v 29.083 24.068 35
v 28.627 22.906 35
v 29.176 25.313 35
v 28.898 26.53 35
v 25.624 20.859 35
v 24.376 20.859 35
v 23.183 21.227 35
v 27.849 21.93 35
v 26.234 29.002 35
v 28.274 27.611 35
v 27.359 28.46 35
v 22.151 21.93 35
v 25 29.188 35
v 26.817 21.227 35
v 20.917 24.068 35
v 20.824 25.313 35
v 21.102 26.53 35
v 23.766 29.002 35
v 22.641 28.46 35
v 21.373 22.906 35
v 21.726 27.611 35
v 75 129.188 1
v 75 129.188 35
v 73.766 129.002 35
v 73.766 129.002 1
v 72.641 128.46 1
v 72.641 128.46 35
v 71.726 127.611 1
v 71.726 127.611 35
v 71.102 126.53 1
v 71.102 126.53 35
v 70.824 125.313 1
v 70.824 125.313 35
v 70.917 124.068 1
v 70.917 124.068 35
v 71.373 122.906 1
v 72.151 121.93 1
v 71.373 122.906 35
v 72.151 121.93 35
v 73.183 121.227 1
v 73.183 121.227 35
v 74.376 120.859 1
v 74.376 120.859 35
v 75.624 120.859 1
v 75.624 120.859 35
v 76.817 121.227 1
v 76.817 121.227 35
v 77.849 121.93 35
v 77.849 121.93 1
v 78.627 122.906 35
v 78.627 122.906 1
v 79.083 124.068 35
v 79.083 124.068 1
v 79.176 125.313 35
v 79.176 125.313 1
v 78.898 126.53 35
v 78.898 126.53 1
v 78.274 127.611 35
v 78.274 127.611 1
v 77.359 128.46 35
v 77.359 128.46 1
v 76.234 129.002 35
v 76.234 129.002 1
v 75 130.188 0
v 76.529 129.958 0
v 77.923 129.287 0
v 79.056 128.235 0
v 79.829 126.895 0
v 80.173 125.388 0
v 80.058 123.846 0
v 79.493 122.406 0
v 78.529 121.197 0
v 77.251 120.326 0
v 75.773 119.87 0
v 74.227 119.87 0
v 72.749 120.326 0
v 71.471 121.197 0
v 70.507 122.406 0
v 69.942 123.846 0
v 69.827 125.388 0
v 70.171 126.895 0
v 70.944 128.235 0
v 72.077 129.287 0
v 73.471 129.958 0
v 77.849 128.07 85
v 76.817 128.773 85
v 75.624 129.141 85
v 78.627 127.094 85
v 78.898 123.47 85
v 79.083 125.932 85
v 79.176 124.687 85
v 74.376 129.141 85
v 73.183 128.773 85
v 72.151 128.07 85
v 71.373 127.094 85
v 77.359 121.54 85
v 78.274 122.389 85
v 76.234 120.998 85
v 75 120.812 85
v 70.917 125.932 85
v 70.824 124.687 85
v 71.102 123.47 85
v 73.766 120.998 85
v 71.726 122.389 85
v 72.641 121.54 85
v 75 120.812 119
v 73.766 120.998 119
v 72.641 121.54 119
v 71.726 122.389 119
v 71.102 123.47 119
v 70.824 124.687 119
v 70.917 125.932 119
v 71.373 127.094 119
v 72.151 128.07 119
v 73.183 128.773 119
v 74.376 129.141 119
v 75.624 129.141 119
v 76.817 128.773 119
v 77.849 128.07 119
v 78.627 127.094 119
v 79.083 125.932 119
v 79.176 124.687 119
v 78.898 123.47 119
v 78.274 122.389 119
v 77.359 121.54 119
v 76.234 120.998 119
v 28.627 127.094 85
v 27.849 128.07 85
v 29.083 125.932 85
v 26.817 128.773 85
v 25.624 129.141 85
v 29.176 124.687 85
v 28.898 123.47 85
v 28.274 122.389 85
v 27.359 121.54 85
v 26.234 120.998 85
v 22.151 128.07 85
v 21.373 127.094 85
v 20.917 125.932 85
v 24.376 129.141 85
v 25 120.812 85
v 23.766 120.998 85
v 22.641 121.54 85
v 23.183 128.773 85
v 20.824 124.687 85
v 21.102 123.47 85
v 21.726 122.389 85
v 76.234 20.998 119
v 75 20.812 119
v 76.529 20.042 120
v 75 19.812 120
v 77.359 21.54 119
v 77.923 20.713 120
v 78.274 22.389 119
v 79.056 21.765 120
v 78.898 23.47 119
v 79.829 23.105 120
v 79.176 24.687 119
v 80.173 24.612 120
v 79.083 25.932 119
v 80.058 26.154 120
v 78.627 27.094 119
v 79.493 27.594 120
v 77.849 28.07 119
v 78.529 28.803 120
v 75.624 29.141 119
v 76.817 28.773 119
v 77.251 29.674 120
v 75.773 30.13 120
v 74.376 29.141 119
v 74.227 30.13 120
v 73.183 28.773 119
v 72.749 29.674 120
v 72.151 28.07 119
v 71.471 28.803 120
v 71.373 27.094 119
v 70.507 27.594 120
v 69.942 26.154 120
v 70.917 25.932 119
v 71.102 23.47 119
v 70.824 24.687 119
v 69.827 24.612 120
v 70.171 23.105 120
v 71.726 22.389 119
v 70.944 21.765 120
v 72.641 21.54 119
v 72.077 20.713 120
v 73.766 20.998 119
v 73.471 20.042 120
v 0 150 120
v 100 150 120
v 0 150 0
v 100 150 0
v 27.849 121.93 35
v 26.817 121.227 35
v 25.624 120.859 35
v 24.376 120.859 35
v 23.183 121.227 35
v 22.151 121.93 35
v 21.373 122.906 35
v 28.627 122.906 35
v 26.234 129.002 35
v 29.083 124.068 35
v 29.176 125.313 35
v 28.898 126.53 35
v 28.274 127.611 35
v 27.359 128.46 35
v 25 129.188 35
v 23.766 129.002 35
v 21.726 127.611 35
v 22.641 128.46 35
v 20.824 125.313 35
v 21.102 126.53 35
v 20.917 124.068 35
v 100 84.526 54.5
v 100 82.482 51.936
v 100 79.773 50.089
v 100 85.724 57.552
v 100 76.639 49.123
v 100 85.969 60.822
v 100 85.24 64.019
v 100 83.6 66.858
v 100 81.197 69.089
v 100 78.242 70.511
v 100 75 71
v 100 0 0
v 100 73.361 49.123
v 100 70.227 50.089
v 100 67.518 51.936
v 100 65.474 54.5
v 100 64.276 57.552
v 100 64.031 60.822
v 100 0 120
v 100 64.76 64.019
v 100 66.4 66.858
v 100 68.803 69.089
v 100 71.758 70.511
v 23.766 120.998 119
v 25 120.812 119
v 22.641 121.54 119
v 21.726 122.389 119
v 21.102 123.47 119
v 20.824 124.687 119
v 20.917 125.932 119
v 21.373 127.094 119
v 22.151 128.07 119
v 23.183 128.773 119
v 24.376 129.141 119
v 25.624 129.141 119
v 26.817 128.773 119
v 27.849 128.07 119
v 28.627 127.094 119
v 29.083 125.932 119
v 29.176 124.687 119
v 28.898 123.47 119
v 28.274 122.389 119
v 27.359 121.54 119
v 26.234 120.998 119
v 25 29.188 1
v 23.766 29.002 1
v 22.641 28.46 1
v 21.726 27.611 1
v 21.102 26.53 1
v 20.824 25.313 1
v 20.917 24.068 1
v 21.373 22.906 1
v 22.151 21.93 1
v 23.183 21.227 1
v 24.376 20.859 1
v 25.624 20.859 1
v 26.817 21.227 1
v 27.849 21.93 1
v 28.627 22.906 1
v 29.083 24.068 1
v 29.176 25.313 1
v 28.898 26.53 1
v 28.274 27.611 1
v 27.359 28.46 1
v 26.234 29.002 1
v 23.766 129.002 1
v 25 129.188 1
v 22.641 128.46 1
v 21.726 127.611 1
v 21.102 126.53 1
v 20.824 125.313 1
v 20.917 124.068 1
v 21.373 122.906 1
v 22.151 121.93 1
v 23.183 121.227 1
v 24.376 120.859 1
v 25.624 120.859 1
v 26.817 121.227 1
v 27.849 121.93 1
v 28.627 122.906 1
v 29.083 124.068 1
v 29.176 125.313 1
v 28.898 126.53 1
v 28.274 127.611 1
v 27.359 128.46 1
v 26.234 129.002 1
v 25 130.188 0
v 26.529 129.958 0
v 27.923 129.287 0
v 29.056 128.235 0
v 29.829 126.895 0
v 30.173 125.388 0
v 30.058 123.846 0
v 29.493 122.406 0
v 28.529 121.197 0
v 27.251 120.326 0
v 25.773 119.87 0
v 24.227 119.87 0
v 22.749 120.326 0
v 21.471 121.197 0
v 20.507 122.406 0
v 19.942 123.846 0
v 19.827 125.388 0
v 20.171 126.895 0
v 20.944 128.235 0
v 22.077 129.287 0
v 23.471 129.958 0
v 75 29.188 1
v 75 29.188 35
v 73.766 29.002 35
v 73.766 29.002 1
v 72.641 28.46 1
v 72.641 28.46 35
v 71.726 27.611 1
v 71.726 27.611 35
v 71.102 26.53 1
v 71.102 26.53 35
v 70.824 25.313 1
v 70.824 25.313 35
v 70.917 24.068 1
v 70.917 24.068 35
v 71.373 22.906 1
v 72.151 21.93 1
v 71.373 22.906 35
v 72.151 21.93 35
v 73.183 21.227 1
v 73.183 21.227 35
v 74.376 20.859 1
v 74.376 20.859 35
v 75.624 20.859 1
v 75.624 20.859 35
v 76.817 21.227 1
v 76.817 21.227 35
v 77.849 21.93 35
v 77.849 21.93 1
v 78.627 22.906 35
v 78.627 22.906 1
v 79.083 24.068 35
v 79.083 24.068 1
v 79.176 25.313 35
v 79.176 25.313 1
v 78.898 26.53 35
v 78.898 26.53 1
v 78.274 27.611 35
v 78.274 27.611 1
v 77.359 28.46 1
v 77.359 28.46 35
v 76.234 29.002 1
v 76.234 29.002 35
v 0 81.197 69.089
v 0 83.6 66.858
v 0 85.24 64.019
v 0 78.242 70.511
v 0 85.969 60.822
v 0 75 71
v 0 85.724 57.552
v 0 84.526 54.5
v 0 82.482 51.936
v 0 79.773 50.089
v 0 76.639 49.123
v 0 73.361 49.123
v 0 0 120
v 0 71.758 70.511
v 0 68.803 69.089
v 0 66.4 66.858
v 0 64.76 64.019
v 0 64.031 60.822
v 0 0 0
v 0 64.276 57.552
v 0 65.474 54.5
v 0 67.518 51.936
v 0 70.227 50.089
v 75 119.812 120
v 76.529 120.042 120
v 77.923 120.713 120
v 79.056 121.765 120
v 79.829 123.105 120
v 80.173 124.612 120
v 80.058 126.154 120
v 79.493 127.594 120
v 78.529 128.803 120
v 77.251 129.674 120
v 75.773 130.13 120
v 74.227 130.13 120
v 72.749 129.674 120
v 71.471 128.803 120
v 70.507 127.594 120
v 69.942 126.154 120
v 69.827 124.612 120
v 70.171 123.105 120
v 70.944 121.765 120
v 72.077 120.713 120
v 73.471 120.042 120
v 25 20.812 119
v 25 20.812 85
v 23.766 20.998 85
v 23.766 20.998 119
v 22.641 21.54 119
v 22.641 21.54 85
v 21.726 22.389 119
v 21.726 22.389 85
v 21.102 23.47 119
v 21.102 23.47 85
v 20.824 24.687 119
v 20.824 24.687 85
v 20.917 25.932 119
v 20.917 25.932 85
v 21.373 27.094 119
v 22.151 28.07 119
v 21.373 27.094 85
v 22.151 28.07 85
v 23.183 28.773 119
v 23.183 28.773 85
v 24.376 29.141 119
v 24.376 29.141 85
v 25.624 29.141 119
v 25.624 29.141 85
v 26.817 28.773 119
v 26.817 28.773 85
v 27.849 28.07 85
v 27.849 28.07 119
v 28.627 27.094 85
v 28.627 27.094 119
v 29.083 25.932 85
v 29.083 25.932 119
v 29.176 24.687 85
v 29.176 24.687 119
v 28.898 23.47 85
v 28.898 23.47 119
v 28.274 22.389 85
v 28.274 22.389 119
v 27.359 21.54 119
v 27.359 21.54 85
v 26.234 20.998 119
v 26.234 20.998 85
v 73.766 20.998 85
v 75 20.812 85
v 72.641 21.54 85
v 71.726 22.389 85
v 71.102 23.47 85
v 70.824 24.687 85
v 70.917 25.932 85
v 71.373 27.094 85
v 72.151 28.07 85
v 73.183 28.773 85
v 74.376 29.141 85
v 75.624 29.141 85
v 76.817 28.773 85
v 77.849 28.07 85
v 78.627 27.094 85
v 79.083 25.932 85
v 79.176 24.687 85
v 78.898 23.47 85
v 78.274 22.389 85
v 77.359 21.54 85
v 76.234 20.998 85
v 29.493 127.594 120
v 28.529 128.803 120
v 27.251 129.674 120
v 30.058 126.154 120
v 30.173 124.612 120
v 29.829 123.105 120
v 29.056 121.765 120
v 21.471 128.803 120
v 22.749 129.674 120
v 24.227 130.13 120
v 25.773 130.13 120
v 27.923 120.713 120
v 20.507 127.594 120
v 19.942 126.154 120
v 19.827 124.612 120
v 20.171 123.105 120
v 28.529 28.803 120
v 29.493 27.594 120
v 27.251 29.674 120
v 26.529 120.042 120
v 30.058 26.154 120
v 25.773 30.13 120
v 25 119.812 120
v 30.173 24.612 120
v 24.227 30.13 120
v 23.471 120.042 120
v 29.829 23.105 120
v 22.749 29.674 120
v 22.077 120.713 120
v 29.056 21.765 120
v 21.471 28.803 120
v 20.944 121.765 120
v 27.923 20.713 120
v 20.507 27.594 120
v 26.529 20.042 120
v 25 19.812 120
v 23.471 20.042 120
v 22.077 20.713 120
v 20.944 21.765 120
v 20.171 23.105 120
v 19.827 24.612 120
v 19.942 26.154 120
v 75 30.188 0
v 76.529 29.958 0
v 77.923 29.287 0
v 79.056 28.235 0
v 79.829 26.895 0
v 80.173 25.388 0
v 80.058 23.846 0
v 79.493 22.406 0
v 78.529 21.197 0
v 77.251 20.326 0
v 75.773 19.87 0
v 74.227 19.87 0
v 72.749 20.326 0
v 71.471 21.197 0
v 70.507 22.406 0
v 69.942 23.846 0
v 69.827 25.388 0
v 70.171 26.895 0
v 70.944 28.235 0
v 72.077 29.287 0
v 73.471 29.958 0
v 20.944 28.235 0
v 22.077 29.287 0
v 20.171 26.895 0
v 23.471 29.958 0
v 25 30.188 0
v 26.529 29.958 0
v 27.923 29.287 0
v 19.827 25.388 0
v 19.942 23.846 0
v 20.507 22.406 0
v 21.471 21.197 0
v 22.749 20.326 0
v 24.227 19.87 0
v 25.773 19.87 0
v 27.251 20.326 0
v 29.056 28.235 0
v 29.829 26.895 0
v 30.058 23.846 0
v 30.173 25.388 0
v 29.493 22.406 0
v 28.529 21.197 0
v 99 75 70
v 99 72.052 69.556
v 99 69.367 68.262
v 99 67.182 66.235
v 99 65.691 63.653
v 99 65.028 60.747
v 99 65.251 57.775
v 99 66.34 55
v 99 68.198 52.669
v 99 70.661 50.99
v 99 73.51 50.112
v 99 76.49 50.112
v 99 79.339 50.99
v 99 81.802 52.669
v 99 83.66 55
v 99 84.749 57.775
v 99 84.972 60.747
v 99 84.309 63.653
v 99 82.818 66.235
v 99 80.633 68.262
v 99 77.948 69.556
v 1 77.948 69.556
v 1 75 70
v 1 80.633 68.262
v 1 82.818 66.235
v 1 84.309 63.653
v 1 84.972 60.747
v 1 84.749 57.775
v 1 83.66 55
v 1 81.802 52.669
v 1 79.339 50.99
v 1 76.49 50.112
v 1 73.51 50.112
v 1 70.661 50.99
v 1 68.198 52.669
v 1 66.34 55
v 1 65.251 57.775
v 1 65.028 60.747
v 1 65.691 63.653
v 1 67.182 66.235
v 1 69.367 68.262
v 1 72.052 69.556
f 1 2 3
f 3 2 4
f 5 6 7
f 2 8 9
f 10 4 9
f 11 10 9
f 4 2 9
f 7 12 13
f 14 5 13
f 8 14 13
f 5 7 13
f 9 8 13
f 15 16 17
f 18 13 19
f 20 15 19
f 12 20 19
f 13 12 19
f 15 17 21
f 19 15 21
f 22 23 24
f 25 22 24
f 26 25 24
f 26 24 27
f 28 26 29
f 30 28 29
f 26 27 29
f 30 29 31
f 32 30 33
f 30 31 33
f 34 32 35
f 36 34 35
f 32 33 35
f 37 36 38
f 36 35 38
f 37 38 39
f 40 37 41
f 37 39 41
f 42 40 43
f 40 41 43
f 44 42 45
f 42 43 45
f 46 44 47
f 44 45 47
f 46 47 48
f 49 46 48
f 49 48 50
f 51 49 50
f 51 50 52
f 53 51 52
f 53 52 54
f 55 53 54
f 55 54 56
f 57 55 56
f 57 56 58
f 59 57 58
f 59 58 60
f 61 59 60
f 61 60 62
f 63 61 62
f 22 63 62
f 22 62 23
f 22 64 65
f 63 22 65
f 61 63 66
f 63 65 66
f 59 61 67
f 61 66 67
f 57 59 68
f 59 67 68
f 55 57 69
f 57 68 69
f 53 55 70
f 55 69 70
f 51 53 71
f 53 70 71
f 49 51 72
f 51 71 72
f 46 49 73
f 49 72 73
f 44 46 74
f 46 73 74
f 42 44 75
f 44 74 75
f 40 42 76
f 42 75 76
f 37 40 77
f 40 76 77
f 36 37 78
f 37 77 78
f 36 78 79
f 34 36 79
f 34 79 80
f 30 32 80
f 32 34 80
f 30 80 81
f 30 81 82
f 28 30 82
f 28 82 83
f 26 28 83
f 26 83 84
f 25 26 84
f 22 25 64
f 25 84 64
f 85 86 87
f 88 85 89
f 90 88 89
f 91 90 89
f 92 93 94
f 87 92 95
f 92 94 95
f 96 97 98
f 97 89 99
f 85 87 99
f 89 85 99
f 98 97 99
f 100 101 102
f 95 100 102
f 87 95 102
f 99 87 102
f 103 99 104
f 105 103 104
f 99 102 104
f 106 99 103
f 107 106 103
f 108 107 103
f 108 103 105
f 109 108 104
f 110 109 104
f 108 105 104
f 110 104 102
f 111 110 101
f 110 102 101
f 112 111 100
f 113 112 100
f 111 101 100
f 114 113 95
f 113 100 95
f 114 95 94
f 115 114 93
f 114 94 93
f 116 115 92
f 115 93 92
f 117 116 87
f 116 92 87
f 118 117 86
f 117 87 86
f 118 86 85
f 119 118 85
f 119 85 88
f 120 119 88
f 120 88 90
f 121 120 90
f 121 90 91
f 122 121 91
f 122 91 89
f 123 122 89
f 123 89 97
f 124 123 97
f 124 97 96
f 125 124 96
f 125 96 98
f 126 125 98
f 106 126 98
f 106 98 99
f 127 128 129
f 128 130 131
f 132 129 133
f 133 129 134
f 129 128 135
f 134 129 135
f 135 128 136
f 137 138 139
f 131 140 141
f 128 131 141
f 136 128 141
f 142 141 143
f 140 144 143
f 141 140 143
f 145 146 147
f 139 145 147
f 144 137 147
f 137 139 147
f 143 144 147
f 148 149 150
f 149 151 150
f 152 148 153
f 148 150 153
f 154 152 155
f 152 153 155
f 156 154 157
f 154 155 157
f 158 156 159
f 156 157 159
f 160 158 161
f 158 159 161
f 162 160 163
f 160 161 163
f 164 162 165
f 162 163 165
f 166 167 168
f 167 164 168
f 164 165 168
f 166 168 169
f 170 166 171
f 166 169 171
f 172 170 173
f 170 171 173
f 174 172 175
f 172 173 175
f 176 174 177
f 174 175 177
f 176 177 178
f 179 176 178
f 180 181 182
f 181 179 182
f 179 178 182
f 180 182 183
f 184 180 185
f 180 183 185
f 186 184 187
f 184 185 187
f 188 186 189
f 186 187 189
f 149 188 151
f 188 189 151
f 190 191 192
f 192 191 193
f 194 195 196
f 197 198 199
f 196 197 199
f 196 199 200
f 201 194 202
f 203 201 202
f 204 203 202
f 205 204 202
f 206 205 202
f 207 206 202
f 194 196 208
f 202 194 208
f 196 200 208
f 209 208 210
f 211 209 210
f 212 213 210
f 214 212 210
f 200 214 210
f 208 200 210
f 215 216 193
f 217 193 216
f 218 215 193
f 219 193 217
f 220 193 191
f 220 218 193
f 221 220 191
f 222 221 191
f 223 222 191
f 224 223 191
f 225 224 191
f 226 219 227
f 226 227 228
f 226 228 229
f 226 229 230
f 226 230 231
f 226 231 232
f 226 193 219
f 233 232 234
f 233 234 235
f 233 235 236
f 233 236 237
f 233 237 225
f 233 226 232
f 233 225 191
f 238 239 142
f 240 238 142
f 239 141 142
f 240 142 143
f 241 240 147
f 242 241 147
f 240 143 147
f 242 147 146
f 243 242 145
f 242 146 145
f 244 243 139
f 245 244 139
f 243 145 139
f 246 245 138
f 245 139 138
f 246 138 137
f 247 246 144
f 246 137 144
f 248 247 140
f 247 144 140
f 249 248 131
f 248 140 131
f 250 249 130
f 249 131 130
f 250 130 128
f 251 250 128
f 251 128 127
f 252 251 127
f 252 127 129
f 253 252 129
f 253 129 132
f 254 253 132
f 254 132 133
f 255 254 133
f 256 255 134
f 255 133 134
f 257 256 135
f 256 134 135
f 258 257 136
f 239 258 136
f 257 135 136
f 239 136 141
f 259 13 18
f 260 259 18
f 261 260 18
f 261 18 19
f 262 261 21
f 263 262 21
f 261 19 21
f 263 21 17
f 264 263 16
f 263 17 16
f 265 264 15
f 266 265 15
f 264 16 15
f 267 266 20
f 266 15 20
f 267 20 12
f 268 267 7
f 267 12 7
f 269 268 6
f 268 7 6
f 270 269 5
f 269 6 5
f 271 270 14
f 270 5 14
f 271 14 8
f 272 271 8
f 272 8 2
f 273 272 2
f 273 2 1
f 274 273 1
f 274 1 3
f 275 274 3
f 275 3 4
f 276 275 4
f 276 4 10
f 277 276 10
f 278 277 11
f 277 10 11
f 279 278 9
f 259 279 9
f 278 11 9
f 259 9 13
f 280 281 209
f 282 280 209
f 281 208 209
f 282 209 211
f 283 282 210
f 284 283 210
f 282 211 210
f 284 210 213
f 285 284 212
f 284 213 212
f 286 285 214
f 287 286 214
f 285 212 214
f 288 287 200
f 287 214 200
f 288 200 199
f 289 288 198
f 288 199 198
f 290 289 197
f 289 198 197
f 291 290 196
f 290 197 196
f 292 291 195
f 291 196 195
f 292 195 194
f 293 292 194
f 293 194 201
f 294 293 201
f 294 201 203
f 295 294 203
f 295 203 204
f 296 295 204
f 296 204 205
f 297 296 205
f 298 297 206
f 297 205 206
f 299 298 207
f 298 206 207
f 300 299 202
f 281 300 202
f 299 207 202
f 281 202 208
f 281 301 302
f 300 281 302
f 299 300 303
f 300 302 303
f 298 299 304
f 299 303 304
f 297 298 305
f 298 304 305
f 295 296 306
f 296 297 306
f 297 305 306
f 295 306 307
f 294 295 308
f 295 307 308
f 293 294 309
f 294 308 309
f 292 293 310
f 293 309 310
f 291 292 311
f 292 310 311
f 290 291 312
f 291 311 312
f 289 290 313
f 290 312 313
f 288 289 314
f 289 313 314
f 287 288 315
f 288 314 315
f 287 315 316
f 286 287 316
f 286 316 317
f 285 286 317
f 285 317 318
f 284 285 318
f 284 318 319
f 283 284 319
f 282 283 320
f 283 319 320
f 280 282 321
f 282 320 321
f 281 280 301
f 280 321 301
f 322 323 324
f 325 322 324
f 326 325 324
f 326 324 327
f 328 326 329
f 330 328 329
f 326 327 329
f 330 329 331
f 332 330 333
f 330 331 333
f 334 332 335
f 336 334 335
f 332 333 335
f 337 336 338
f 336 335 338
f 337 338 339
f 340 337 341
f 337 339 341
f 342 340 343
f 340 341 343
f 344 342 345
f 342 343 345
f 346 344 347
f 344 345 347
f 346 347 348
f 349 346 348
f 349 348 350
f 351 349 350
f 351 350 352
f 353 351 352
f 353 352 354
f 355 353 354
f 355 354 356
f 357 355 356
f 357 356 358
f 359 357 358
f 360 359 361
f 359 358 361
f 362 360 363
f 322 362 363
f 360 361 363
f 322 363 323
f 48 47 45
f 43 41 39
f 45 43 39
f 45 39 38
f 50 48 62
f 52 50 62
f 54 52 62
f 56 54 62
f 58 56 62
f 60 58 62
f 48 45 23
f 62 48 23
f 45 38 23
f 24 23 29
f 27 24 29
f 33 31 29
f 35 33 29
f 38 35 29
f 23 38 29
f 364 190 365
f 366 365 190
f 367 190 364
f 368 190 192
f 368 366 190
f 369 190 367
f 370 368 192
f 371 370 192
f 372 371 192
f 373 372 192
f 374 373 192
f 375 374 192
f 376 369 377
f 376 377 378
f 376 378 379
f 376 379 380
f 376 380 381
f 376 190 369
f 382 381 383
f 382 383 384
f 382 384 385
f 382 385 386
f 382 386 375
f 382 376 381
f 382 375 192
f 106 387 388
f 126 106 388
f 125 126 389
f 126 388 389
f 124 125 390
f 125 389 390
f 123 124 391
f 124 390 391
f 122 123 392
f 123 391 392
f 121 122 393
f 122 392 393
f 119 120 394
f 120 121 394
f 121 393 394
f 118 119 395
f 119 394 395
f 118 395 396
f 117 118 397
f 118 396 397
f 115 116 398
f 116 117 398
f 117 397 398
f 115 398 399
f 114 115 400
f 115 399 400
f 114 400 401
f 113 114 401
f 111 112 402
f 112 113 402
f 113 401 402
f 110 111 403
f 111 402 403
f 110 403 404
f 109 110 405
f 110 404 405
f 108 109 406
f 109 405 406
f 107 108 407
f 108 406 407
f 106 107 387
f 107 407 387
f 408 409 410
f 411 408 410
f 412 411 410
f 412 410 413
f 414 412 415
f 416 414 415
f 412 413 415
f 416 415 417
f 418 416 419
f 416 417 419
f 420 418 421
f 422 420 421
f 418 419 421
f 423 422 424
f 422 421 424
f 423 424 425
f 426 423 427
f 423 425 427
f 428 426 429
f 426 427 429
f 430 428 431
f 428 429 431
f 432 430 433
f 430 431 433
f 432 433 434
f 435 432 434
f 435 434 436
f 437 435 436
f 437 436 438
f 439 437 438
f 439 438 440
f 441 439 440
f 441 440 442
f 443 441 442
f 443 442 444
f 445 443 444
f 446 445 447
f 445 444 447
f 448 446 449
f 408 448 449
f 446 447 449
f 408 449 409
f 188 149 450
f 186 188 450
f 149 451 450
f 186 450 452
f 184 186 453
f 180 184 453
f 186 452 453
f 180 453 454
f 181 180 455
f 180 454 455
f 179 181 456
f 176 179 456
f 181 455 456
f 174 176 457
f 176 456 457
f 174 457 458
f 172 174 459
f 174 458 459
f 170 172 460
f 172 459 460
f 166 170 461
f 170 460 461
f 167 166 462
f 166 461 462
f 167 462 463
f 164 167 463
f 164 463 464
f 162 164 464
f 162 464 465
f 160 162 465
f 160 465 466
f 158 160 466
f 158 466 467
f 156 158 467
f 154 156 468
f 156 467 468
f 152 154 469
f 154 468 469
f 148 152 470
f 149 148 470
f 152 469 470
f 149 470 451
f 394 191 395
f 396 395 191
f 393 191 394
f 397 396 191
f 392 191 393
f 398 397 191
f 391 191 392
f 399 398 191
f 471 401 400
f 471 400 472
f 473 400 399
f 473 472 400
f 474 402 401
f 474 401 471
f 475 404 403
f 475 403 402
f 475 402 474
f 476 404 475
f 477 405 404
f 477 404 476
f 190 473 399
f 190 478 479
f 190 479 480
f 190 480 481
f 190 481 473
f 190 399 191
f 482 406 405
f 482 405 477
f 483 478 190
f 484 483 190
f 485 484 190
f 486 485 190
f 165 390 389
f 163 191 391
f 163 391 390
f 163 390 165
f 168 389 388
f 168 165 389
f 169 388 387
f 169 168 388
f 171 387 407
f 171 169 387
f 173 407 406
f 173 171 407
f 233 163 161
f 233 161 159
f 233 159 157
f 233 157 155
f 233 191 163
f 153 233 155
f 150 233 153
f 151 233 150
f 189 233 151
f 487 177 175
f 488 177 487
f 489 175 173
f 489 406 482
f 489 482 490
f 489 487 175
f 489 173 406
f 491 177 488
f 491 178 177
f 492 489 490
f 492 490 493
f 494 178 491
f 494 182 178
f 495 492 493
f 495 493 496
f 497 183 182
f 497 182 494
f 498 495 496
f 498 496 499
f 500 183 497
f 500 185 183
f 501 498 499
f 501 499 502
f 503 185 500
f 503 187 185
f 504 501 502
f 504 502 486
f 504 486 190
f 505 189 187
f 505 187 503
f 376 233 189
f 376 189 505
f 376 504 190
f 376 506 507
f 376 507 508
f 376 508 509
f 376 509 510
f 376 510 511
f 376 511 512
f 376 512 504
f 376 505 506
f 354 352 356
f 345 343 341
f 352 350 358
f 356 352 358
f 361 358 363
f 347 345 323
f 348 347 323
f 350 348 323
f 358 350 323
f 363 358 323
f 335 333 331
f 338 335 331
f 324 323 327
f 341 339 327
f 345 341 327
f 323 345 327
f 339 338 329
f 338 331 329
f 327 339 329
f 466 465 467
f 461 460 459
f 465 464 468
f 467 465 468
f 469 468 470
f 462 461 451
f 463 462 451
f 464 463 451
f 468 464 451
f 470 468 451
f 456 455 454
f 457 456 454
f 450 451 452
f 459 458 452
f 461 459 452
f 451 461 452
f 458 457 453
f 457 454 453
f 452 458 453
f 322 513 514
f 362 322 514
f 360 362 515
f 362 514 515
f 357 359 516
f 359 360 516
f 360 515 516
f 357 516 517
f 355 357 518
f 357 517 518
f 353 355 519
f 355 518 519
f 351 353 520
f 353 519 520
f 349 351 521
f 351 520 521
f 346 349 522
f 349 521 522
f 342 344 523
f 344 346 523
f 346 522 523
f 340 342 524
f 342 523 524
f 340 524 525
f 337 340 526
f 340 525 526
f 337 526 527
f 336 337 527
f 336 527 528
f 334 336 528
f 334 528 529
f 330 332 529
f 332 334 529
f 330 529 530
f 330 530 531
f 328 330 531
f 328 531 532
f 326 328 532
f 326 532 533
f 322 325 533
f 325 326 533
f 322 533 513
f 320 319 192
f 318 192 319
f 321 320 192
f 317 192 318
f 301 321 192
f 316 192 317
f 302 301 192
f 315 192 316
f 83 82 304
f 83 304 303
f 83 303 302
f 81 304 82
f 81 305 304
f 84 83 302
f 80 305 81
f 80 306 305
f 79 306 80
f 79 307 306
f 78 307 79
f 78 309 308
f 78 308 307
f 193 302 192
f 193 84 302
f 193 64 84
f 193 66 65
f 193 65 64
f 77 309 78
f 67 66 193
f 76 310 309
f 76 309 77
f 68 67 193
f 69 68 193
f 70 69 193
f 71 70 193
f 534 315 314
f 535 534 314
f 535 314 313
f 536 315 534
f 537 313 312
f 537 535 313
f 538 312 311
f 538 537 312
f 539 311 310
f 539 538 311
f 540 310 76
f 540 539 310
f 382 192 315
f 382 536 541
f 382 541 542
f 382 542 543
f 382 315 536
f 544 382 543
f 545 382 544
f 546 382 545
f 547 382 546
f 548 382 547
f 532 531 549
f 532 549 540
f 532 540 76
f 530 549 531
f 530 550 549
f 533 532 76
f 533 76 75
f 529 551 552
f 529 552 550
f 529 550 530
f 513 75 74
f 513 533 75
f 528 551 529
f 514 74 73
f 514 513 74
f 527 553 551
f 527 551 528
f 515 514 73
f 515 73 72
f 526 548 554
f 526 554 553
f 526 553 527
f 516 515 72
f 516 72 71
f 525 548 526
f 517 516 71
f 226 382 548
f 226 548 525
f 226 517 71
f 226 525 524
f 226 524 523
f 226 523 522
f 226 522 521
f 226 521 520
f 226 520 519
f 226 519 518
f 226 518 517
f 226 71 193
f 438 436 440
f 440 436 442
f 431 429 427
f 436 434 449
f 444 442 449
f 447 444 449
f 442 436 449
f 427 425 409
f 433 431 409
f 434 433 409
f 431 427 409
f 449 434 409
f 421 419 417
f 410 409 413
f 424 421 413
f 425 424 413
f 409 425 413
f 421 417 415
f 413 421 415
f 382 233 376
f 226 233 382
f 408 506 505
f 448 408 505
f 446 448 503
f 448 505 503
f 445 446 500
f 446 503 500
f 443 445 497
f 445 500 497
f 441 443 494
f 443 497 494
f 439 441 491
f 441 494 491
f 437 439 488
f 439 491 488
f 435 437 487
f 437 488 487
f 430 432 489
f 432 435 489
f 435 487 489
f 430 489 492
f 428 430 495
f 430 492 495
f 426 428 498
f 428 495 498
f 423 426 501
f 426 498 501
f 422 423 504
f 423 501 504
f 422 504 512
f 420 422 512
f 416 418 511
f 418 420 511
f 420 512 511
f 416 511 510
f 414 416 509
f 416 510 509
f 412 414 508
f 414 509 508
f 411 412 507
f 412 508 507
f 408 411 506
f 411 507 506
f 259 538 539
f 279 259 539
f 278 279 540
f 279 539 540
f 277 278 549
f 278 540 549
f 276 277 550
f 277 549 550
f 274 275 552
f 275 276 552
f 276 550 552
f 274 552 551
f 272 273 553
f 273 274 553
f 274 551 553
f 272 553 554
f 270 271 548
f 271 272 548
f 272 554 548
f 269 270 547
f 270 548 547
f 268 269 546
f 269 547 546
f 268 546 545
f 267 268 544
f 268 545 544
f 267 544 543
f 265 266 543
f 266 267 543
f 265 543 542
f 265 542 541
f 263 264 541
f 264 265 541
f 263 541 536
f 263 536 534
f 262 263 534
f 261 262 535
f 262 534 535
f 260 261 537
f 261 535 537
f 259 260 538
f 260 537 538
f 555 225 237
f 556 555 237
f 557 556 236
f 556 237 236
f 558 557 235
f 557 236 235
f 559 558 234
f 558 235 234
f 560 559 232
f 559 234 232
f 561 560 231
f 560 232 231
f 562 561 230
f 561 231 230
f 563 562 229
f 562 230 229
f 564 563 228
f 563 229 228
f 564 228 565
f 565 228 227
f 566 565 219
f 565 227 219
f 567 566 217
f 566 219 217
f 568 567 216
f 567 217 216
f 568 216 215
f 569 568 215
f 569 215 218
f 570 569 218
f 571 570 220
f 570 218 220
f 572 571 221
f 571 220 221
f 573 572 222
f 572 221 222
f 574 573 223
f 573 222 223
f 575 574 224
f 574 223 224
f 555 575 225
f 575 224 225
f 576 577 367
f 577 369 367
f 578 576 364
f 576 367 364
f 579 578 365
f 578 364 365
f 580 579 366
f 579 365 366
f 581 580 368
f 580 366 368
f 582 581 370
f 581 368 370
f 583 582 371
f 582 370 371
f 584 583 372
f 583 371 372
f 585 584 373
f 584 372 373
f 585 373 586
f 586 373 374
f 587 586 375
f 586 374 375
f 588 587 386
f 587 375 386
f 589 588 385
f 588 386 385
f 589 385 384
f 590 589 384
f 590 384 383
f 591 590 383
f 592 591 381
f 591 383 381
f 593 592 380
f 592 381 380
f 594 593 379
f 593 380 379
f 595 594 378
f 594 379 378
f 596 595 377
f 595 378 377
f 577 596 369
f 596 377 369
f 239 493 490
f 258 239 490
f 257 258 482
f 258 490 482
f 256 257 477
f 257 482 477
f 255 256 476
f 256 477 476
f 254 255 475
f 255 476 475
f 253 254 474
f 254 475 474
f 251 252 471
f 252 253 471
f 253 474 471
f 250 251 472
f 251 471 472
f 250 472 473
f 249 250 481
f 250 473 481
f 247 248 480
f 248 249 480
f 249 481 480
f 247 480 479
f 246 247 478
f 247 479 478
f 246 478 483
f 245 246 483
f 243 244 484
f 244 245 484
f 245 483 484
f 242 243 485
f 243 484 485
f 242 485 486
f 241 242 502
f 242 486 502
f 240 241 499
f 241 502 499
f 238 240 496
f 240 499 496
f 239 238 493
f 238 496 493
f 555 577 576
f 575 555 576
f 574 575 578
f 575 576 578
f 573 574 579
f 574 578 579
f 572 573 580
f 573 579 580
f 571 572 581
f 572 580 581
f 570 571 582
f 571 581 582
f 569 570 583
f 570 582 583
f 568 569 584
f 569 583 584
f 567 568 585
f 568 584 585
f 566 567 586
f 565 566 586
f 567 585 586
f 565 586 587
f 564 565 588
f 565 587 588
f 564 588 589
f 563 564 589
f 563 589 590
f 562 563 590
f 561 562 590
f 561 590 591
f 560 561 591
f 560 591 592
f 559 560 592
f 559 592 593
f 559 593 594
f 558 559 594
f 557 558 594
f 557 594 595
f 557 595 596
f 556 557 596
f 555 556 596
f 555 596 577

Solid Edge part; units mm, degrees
sketch "Sketch1" plane through (0, 0, 0) normal (0, -1, 0) x (1, 0, 0)
  line L0 (0, 120) -> (0, 0)
  line L1 (0, 0) -> (100, 0)
  line L2 (100, 0) -> (100, 120)
  line L3 (100, 120) -> (0, 120)
extrude "Protrusion1" add sketch "Sketch1" against normal blind 150
hole "Hole1" at (25, 25, 120) direction (0, 0, -1) diameter 8.376 depth 35 start chamfer 1 start chamfer angle 45
hole "Hole2" at (25, 125, 120) direction (0, 0, -1) diameter 8.376 depth 35 start chamfer 1 start chamfer angle 45
hole "Hole3" at (75, 125, 120) direction (0, 0, -1) diameter 8.376 depth 35 start chamfer 1 start chamfer angle 45
hole "Hole4" at (75, 25, 120) direction (0, 0, -1) diameter 8.376 depth 35 start chamfer 1 start chamfer angle 45
hole "Hole5" at (25, 25, 0) direction (0, 0, 1) diameter 8.376 depth 35 start chamfer 1 start chamfer angle 45
hole "Hole6" at (75, 25, 0) direction (0, 0, 1) diameter 8.376 depth 35 start chamfer 1 start chamfer angle 45
hole "Hole7" at (75, 125, 0) direction (0, 0, 1) diameter 8.376 depth 35 start chamfer 1 start chamfer angle 45
hole "Hole8" at (25, 125, 0) direction (0, 0, 1) diameter 8.376 depth 35 start chamfer 1 start chamfer angle 45
hole "Achsenhalterung_Schubkarr" at (0, 75, 60) direction (1, 0, 0) diameter 20 end through all start chamfer 1 start chamfer angle 45 end chamfer 1 end chamfer angle 45
